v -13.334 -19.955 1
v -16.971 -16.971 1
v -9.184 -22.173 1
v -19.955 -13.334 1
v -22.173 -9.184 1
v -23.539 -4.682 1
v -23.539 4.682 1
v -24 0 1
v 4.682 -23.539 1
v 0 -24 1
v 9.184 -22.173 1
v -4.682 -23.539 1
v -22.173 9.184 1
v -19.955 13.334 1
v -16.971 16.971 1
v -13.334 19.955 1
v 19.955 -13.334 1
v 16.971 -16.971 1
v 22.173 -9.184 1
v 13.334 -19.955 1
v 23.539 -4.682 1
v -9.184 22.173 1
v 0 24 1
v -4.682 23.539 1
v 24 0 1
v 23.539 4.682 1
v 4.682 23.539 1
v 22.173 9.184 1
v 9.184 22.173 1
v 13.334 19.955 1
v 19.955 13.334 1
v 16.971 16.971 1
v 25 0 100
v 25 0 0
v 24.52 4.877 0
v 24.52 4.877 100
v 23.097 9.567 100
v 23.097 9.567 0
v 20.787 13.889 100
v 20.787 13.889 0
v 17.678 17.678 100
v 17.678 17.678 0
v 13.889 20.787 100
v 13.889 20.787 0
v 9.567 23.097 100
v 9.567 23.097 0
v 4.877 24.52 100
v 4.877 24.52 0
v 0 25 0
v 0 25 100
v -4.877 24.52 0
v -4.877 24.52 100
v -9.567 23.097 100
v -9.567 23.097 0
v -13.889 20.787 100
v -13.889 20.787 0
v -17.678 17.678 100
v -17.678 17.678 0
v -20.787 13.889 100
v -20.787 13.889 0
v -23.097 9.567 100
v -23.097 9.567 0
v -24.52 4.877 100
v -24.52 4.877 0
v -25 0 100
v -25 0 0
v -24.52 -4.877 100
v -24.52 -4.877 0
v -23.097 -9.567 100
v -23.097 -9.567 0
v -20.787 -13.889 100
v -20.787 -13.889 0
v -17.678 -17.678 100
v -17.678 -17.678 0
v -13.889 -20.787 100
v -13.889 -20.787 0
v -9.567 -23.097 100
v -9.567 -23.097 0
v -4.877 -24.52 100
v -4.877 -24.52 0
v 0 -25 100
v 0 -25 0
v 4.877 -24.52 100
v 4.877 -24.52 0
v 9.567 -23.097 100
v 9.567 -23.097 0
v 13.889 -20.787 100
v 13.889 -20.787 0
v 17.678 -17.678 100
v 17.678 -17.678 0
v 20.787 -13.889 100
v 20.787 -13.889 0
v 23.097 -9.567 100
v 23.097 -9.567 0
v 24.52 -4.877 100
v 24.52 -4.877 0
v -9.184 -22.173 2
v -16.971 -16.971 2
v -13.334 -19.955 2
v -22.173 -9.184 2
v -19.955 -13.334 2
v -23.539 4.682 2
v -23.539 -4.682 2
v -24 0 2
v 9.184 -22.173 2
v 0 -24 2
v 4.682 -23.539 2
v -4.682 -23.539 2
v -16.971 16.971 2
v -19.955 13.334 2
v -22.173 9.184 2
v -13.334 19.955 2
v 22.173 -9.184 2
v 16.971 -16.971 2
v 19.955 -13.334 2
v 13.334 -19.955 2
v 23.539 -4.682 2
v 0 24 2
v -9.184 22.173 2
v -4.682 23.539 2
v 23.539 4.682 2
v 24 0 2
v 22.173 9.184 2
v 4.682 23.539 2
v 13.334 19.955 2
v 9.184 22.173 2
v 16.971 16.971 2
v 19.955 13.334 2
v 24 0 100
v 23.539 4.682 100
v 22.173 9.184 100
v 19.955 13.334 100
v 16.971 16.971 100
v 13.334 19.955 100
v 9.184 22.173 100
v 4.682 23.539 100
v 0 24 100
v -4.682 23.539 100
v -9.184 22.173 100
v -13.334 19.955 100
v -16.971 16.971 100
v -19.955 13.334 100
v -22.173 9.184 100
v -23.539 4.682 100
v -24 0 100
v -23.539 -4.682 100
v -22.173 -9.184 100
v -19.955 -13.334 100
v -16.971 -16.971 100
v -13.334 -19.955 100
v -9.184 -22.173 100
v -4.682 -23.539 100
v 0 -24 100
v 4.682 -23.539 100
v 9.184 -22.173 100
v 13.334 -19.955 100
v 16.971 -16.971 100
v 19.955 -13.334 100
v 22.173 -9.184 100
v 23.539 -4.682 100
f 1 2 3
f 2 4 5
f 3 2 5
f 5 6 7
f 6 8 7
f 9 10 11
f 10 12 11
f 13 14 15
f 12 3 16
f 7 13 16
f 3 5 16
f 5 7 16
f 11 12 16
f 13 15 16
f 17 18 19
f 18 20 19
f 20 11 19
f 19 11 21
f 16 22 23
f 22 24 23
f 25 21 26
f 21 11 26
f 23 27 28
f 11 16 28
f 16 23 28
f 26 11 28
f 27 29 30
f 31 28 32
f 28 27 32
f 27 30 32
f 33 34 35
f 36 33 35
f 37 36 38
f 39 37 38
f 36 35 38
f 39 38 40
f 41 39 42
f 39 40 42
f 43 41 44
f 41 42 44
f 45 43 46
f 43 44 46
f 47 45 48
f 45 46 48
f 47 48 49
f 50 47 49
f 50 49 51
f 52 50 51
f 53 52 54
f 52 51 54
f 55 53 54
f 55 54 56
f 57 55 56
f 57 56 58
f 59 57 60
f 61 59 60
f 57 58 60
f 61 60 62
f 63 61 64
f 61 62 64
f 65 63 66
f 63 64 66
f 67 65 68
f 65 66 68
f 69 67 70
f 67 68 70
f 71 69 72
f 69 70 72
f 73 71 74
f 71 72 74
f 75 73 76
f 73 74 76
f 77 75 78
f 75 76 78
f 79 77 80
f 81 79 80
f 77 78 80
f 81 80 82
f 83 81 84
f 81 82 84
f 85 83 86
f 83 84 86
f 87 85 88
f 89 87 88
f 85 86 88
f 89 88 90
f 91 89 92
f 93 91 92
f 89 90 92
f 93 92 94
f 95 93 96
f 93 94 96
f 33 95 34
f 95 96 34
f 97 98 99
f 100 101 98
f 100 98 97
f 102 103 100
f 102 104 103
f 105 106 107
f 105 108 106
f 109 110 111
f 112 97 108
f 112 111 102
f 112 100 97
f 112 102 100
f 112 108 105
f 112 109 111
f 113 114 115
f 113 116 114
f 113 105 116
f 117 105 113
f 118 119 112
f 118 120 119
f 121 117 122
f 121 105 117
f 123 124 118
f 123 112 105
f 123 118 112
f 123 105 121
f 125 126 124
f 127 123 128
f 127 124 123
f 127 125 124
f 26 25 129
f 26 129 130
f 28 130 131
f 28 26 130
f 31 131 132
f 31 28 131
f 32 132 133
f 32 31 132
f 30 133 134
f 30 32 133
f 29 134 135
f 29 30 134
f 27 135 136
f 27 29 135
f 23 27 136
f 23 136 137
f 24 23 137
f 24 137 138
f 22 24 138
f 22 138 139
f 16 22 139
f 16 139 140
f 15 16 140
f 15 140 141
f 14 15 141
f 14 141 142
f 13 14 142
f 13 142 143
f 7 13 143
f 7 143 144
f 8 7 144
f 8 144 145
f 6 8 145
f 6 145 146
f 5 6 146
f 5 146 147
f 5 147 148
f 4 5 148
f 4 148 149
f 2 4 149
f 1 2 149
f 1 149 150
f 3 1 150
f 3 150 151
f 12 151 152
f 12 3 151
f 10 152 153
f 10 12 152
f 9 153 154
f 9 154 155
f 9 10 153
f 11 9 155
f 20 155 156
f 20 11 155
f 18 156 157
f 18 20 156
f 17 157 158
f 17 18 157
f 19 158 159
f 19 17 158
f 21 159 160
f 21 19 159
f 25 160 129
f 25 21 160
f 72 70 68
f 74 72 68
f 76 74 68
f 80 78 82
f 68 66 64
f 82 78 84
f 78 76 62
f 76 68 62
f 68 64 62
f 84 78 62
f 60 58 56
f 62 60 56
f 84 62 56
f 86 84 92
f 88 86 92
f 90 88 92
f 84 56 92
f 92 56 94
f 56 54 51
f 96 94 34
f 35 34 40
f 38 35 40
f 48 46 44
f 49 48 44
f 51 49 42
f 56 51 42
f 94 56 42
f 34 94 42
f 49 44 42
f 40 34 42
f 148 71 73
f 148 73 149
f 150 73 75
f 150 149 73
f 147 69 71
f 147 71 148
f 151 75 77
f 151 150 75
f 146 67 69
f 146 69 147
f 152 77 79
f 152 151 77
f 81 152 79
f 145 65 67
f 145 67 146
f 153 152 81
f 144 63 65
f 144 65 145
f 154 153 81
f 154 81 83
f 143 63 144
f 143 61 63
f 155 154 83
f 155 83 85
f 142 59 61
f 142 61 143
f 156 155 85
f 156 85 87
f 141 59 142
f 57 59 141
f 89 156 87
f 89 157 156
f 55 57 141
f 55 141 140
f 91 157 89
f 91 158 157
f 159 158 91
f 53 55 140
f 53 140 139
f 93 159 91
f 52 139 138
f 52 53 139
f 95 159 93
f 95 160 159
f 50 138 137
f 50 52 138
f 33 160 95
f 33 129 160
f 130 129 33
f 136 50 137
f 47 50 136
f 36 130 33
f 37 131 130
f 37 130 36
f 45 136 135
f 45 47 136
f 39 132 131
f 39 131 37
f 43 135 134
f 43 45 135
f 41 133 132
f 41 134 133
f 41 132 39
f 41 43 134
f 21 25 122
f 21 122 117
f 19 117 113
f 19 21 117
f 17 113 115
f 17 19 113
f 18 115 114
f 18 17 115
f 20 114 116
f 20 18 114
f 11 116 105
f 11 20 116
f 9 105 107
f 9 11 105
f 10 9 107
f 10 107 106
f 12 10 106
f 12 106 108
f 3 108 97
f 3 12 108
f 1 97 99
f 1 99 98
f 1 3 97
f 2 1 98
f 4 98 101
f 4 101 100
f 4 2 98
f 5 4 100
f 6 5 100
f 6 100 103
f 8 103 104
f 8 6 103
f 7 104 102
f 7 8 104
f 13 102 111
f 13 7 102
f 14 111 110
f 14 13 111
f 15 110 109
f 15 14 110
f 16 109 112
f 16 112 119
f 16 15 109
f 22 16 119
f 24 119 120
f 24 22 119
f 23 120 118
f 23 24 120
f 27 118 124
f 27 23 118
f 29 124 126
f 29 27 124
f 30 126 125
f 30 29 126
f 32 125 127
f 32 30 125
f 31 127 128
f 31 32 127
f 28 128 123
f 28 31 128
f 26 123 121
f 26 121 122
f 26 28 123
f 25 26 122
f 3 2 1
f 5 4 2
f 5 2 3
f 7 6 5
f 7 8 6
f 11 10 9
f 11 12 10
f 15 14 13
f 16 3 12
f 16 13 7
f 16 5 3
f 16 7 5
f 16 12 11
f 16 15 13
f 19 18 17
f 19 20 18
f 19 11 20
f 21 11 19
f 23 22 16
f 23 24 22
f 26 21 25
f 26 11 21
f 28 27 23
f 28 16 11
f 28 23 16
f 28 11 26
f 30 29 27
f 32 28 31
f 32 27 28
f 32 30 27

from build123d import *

# Parameters (mm, degrees)
F0_R     = 25
F1_DEPTH = 100
F2_T     = -1
F3_DEPTH = 1
F4_W     = 3
F4_H     = 3
F5_DEPTH = 5


with BuildPart() as f1:
    # F0 (on Top) → F1 (new body)
    with BuildSketch(Plane.XY):
        Circle(F0_R)
    extrude(amount=F1_DEPTH)

    # F2
    f2_openings = [f1.faces().sort_by_distance(p)[0] for p in [
        (0, 0, 100),
    ]]
    offset(amount=F2_T, openings=f2_openings)


with BuildPart() as f3:
    # F3 (new): a face of the model
    f3_faces = [f1.part.faces().sort_by_distance(p)[0] for p in [
        (0, 0, 1),
    ]]
    extrude(f3_faces, amount=F3_DEPTH)


with BuildPart() as f5:
    # F4 (on Front) → F5 (new body)
    with BuildSketch(Plane.XZ):
        with Locations((0, 4.0237640916)):
            Rectangle(F4_W, F4_H)
    extrude(amount=F5_DEPTH)


solid = Compound([f1.part, f3.part])
